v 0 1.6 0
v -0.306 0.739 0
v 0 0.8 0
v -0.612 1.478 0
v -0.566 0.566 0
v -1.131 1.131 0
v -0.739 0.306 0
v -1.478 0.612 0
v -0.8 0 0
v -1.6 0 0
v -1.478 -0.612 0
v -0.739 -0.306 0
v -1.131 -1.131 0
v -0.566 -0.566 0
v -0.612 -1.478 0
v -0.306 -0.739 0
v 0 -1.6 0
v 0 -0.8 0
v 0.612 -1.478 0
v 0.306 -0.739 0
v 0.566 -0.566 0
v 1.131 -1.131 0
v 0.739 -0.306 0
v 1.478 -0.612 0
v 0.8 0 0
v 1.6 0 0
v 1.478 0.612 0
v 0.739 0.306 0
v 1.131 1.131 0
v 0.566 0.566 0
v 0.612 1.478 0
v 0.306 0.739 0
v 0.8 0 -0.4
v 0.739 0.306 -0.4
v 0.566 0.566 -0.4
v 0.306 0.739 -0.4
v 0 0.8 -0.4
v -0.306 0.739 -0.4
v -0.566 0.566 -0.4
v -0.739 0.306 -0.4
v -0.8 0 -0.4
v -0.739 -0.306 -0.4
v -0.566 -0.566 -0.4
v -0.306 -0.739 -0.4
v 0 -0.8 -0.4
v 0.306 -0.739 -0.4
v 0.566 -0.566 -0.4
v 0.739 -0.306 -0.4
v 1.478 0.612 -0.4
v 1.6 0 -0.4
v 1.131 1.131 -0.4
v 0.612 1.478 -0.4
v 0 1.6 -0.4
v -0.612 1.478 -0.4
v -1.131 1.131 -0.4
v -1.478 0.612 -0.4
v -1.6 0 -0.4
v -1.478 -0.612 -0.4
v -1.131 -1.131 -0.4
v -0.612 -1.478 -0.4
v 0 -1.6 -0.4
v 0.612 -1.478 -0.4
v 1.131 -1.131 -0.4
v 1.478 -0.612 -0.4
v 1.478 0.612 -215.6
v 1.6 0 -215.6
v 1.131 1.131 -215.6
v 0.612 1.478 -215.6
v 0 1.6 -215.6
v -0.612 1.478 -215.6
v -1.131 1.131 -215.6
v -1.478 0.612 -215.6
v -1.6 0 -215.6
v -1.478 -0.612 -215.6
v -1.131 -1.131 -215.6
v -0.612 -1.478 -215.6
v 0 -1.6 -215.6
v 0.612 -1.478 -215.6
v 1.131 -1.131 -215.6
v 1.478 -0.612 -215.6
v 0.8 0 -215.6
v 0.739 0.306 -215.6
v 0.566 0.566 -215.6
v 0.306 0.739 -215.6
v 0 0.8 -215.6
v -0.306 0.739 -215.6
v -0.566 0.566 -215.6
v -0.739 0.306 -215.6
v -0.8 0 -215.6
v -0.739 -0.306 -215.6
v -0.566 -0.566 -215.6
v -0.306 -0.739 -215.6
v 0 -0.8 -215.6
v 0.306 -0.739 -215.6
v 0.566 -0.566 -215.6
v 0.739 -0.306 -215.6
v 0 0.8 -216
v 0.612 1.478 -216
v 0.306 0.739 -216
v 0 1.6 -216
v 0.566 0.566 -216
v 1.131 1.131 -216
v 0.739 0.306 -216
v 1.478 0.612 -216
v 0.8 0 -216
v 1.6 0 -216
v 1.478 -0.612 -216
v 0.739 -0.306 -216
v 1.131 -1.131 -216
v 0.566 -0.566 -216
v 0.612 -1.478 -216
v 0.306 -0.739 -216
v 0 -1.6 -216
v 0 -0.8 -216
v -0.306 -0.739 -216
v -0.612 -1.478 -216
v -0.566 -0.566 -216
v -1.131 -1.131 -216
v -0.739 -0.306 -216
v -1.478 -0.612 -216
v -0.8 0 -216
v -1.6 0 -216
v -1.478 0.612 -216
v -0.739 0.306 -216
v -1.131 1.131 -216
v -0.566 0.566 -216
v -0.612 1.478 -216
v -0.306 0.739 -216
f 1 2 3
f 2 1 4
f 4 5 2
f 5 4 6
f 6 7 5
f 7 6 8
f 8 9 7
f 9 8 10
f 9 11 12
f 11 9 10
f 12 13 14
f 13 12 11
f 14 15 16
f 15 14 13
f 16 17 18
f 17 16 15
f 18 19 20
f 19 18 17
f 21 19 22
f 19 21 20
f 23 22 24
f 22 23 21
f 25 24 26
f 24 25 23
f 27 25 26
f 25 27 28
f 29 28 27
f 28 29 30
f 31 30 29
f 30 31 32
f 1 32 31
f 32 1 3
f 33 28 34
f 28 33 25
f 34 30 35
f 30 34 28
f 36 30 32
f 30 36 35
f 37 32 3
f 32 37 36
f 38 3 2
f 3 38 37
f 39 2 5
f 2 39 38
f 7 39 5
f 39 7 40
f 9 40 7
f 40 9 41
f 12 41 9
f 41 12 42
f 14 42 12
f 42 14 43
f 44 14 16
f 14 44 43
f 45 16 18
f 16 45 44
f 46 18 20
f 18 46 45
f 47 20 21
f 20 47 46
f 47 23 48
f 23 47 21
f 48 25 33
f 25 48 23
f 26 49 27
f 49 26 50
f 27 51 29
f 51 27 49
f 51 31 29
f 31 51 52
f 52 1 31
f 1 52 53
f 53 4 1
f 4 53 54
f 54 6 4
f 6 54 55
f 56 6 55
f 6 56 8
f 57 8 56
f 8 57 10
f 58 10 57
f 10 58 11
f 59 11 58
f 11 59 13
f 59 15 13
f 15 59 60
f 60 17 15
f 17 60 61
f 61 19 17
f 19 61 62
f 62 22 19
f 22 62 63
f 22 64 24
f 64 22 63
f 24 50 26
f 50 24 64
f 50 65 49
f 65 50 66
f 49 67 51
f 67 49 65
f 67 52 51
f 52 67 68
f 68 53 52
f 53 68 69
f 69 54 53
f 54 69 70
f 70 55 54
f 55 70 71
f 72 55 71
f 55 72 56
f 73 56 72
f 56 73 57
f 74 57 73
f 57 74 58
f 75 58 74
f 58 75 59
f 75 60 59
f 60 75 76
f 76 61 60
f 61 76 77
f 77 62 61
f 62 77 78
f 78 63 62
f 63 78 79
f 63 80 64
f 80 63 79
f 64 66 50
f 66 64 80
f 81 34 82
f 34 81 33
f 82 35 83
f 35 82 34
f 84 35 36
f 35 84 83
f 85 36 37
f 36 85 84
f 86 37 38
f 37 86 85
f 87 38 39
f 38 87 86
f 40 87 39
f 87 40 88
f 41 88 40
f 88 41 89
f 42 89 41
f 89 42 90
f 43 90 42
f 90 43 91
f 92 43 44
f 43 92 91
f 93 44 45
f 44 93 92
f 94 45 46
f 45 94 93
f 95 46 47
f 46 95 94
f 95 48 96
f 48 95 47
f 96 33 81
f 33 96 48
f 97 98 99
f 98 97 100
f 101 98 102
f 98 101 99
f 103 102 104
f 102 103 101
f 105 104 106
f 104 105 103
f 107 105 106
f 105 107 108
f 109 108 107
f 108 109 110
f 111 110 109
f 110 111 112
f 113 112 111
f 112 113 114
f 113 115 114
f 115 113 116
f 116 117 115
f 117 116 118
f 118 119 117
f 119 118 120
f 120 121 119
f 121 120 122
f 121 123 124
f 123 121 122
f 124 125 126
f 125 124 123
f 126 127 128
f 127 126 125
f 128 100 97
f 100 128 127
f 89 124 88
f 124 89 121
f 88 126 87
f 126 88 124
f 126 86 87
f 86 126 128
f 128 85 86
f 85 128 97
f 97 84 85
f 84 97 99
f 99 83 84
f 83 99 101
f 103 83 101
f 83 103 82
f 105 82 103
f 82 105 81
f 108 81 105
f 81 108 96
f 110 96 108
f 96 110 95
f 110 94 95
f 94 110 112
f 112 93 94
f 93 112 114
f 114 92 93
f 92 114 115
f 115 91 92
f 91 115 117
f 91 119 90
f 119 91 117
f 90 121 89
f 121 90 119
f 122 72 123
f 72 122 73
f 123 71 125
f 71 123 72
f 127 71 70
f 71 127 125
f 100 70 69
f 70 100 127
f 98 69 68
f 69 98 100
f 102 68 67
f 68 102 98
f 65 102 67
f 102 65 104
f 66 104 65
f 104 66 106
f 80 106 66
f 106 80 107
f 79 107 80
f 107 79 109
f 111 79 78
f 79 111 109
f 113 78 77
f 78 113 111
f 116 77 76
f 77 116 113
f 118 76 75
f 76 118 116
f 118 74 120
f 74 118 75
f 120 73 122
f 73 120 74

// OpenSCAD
// file: ../p/4-4disc.scad
use <../lib.scad>
$fa=1; $fs=0.2;
function ldraw_lib__4_4disc(realsolid=false) = [
// 0 Disc 1.0
// 0 Name: 4-4disc.dat
// 0 Author: James Jessiman
// 0 !LDRAW_ORG Primitive UPDATE 2002-02
// 0 !LICENSE Licensed under CC BY 2.0 and CC BY 4.0 : see CAreadme.txt
// 
// 0 BFC CERTIFY CCW
  [0,"BFC","CERTIFY"],
  [0,"BFC","CCW"],
// 
// 0 !HISTORY 1998-12-15 [PTadmin] Official Update 1998-10
// 0 !HISTORY 2002-03-23 [sbliss] Added BFC statement
// 0 !HISTORY 2002-04-25 [PTadmin] Official Update 2002-02
// 0 !HISTORY 2007-06-24 [PTadmin] Header formatted for Contributor Agreement
// 0 !HISTORY 2008-07-01 [PTadmin] Official Update 2008-01
// 
// 
// 3 16 0 0 0 1 0 0 0.9239 0 0.3827
  [3,16,0,0,0,1,0,0,0.9239,0,0.3827],
// 3 16 0 0 0 0.9239 0 0.3827 0.7071 0 0.7071
  [3,16,0,0,0,0.9239,0,0.3827,0.7071,0,0.7071],
// 3 16 0 0 0 0.7071 0 0.7071 0.3827 0 0.9239
  [3,16,0,0,0,0.7071,0,0.7071,0.3827,0,0.9239],
// 3 16 0 0 0 0.3827 0 0.9239 0 0 1
  [3,16,0,0,0,0.3827,0,0.9239,0,0,1],
// 3 16 0 0 0 0 0 1 -0.3827 0 0.9239
  [3,16,0,0,0,0,0,1,-0.3827,0,0.9239],
// 3 16 0 0 0 -0.3827 0 0.9239 -0.7071 0 0.7071
  [3,16,0,0,0,-0.3827,0,0.9239,-0.7071,0,0.7071],
// 3 16 0 0 0 -0.7071 0 0.7071 -0.9239 0 0.3827
  [3,16,0,0,0,-0.7071,0,0.7071,-0.9239,0,0.3827],
// 3 16 0 0 0 -0.9239 0 0.3827 -1 0 -0
  [3,16,0,0,0,-0.9239,0,0.3827,-1,0,-0],
// 3 16 0 0 0 -1 0 -0 -0.9239 0 -0.3827
  [3,16,0,0,0,-1,0,-0,-0.9239,0,-0.3827],
// 3 16 0 0 0 -0.9239 0 -0.3827 -0.7071 0 -0.7071
  [3,16,0,0,0,-0.9239,0,-0.3827,-0.7071,0,-0.7071],
// 3 16 0 0 0 -0.7071 0 -0.7071 -0.3827 0 -0.9239
  [3,16,0,0,0,-0.7071,0,-0.7071,-0.3827,0,-0.9239],
// 3 16 0 0 0 -0.3827 0 -0.9239 0 0 -1
  [3,16,0,0,0,-0.3827,0,-0.9239,0,0,-1],
// 3 16 0 0 0 0 0 -1 0.3827 0 -0.9239
  [3,16,0,0,0,0,0,-1,0.3827,0,-0.9239],
// 3 16 0 0 0 0.3827 0 -0.9239 0.7071 0 -0.7071
  [3,16,0,0,0,0.3827,0,-0.9239,0.7071,0,-0.7071],
// 3 16 0 0 0 0.7071 0 -0.7071 0.9239 0 -0.3827
  [3,16,0,0,0,0.7071,0,-0.7071,0.9239,0,-0.3827],
// 3 16 0 0 0 0.9239 0 -0.3827 1 0 0
  [3,16,0,0,0,0.9239,0,-0.3827,1,0,0],
// 0
];
module ldraw_lib__4_4disc(step=0, col=false, unit=2/5, alt=false, line=0.2, solid=!$preview)
    makepoly(ldraw_lib__4_4disc(solid), step=step, col=col, unit=unit, alt=alt, line=line, solid=solid);
ldraw_lib__4_4disc(line=0.2);
// file: ../p/stud3.scad
use <../lib.scad>
use <4-4cyli.scad>
use <4-4disc.scad>
use <4-4edge.scad>
$fa=1; $fs=0.2;
function ldraw_lib__stud3(realsolid=false) = realsolid ? 
    [openscad(translate([0,0,-eps()], o=cylinder(4+eps(), r=4)),2)] : [
// 0 Stud Tube Solid
// 0 Name: stud3.dat
// 0 Author: James Jessiman
// 0 !LDRAW_ORG Primitive UPDATE 2012-01
// 0 !LICENSE Licensed under CC BY 2.0 and CC BY 4.0 : see CAreadme.txt
// 
// 0 BFC CERTIFY CCW
  [0,"BFC","CERTIFY"],
  [0,"BFC","CCW"],
// 
// 0 !HISTORY 2002-04-04 [sbliss] Modified for BFC compliance
// 0 !HISTORY 2002-04-25 [PTadmin] Official Update 2002-02
// 0 !HISTORY 2007-06-24 [PTadmin] Header formatted for Contributor Agreement
// 0 !HISTORY 2008-07-01 [PTadmin] Official Update 2008-01
// 0 !HISTORY 2012-02-16 [Philo] Changed to CCW
// 0 !HISTORY 2012-03-30 [PTadmin] Official Update 2012-01
// 
// 
// 1 16 0 -4 0 4 0 0 0 1 0 0 0 4 4-4edge.dat
  [1,16,0,-4,0,4,0,0,0,1,0,0,0,4, ldraw_lib__4_4edge(realsolid)],
// 1 16 0 0 0 4 0 0 0 1 0 0 0 4 4-4edge.dat
  [1,16,0,0,0,4,0,0,0,1,0,0,0,4, ldraw_lib__4_4edge(realsolid)],
// 1 16 0 -4 0 4 0 0 0 1 0 0 0 4 4-4disc.dat
  [1,16,0,-4,0,4,0,0,0,1,0,0,0,4, ldraw_lib__4_4disc(realsolid)],
// 1 16 0 -4 0 4 0 0 0 4 0 0 0 4 4-4cyli.dat
  [1,16,0,-4,0,4,0,0,0,4,0,0,0,4, ldraw_lib__4_4cyli(realsolid)],
];
module ldraw_lib__stud3(step=0, col=false, unit=2/5, alt=false, line=0.2, solid=!$preview)
    makepoly(ldraw_lib__stud3(solid), step=step, col=col, unit=unit, alt=alt, line=line, solid=solid);
ldraw_lib__stud3(line=0.2);
// file: ../p/stud.scad
use <../lib.scad>
use <4-4cyli.scad>
use <4-4disc.scad>
use <4-4edge.scad>
$fa=1; $fs=0.2;
function ldraw_lib__stud(realsolid=false) = realsolid ? 
    [openscad(translate([0,0,-eps()], o=cylinder(4+eps(), r=6)),2)] : [
// 0 Stud
// 0 Name: stud.dat
// 0 Author: James Jessiman
// 0 !LDRAW_ORG Primitive UPDATE 2012-01
// 0 !LICENSE Licensed under CC BY 2.0 and CC BY 4.0 : see CAreadme.txt
// 
// 0 BFC CERTIFY CCW
  [0,"BFC","CERTIFY"],
  [0,"BFC","CCW"],
// 
// 0 !HISTORY 2002-04-04 [sbliss] Modified for BFC compliance
// 0 !HISTORY 2002-04-25 [PTadmin] Official Update 2002-02
// 0 !HISTORY 2007-06-24 [PTadmin] Header formatted for Contributor Agreement
// 0 !HISTORY 2008-07-01 [PTadmin] Official Update 2008-01
// 0 !HISTORY 2012-02-16 [Philo] Changed to CCW
// 0 !HISTORY 2012-03-30 [PTadmin] Official Update 2012-01
// 
// 
// 1 16 0 0 0 6 0 0 0 1 0 0 0 6 4-4edge.dat
  [1,16,0,0,0,6,0,0,0,1,0,0,0,6, ldraw_lib__4_4edge(realsolid)],
// 1 16 0 -4 0 6 0 0 0 1 0 0 0 6 4-4edge.dat
  [1,16,0,-4,0,6,0,0,0,1,0,0,0,6, ldraw_lib__4_4edge(realsolid)],
// 1 16 0 0 0 6 0 0 0 -4 0 0 0 6 4-4cyli.dat
  [1,16,0,0,0,6,0,0,0,-4,0,0,0,6, ldraw_lib__4_4cyli(realsolid)],
// 1 16 0 -4 0 6 0 0 0 1 0 0 0 6 4-4disc.dat
  [1,16,0,-4,0,6,0,0,0,1,0,0,0,6, ldraw_lib__4_4disc(realsolid)],
];
module ldraw_lib__stud(step=0, col=false, unit=2/5, alt=false, line=0.2, solid=!$preview)
    makepoly(ldraw_lib__stud(solid), step=step, col=col, unit=unit, alt=alt, line=line, solid=solid);
ldraw_lib__stud(line=0.2);
// file: ../p/box5.scad
use <../lib.scad>
$fa=1; $fs=0.2;
function ldraw_lib__box5(realsolid=false) = [
// 0 Box with 5 Faces and All Edges
// 0 Name: box5.dat
// 0 Author: James Jessiman
// 0 !LDRAW_ORG Primitive UPDATE 2012-01
// 0 !LICENSE Licensed under CC BY 2.0 and CC BY 4.0 : see CAreadme.txt
// 
// 0 BFC CERTIFY CCW
  [0,"BFC","CERTIFY"],
  [0,"BFC","CCW"],
// 
// 0 !HISTORY 2002-04-03 [sbliss] Modified for BFC compliance
// 0 !HISTORY 2002-04-25 [PTadmin] Official Update 2002-02
// 0 !HISTORY 2007-06-24 [PTadmin] Header formatted for Contributor Agreement
// 0 !HISTORY 2008-07-01 [PTadmin] Official Update 2008-01
// 0 !HISTORY 2012-02-16 [Philo] Changed to CCW
// 0 !HISTORY 2012-03-30 [PTadmin] Official Update 2012-01
// 
// 
// 2 24 1 1 1 -1 1 1
  [2,24,1,1,1,-1,1,1],
// 2 24 -1 1 1 -1 1 -1
  [2,24,-1,1,1,-1,1,-1],
// 2 24 -1 1 -1 1 1 -1
  [2,24,-1,1,-1,1,1,-1],
// 2 24 1 1 -1 1 1 1
  [2,24,1,1,-1,1,1,1],
// 2 24 1 0 1 -1 0 1
  [2,24,1,0,1,-1,0,1],
// 2 24 -1 0 1 -1 0 -1
  [2,24,-1,0,1,-1,0,-1],
// 2 24 -1 0 -1 1 0 -1
  [2,24,-1,0,-1,1,0,-1],
// 2 24 1 0 -1 1 0 1
  [2,24,1,0,-1,1,0,1],
// 2 24 1 0 1 1 1 1
  [2,24,1,0,1,1,1,1],
// 2 24 -1 0 1 -1 1 1
  [2,24,-1,0,1,-1,1,1],
// 2 24 1 0 -1 1 1 -1
  [2,24,1,0,-1,1,1,-1],
// 2 24 -1 0 -1 -1 1 -1
  [2,24,-1,0,-1,-1,1,-1],
// 4 16 -1 1 1 1 1 1 1 1 -1 -1 1 -1
  [4,16,-1,1,1,1,1,1,1,1,-1,-1,1,-1],
// 4 16 -1 1 1 -1 0 1 1 0 1 1 1 1
  [4,16,-1,1,1,-1,0,1,1,0,1,1,1,1],
// 4 16 -1 1 -1 -1 0 -1 -1 0 1 -1 1 1
  [4,16,-1,1,-1,-1,0,-1,-1,0,1,-1,1,1],
// 4 16 1 1 -1 1 0 -1 -1 0 -1 -1 1 -1
  [4,16,1,1,-1,1,0,-1,-1,0,-1,-1,1,-1],
// 4 16 1 1 1 1 0 1 1 0 -1 1 1 -1
  [4,16,1,1,1,1,0,1,1,0,-1,1,1,-1],
];
module ldraw_lib__box5(step=0, col=false, unit=2/5, alt=false, line=0.2, solid=!$preview)
    makepoly(ldraw_lib__box5(solid), step=step, col=col, unit=unit, alt=alt, line=line, solid=solid);
ldraw_lib__box5(line=0.2);
// file: ../p/box4t.scad
use <../lib.scad>
$fa=1; $fs=0.2;
function ldraw_lib__box4t(realsolid=false) = [
// 0 Box with 4 Adjacent Faces and All Edges
// 0 Name: box4t.dat
// 0 Author: Tore Eriksson [Tore_Eriksson]
// 0 !LDRAW_ORG Primitive UPDATE 2003-02
// 0 !LICENSE Licensed under CC BY 2.0 and CC BY 4.0 : see CAreadme.txt
// 
// 0 BFC CERTIFY CCW
  [0,"BFC","CERTIFY"],
  [0,"BFC","CCW"],
// 
// 0 !HISTORY 1997-09-29 [PTadmin] Official Update 1997-15
// 0 !HISTORY 2002-08-31 [izanette] Modified with WINDZ for BFC compliance
// 0 !HISTORY 2003-08-01 [PTadmin] Official Update 2003-02
// 0 !HISTORY 2007-06-24 [PTadmin] Header formatted for Contributor Agreement
// 0 !HISTORY 2008-07-01 [PTadmin] Official Update 2008-01
// 
// 
// 2 24 1 1 1 -1 1 1
  [2,24,1,1,1,-1,1,1],
// 2 24 -1 1 1 -1 1 -1
  [2,24,-1,1,1,-1,1,-1],
// 2 24 -1 1 -1 1 1 -1
  [2,24,-1,1,-1,1,1,-1],
// 2 24 1 1 -1 1 1 1
  [2,24,1,1,-1,1,1,1],
// 2 24 1 0 1 -1 0 1
  [2,24,1,0,1,-1,0,1],
// 2 24 -1 0 1 -1 0 -1
  [2,24,-1,0,1,-1,0,-1],
// 2 24 -1 0 -1 1 0 -1
  [2,24,-1,0,-1,1,0,-1],
// 2 24 1 0 -1 1 0 1
  [2,24,1,0,-1,1,0,1],
// 2 24 1 0 1 1 1 1
  [2,24,1,0,1,1,1,1],
// 2 24 -1 0 1 -1 1 1
  [2,24,-1,0,1,-1,1,1],
// 2 24 1 0 -1 1 1 -1
  [2,24,1,0,-1,1,1,-1],
// 2 24 -1 0 -1 -1 1 -1
  [2,24,-1,0,-1,-1,1,-1],
// 4 16 1 1 1 1 1 -1 -1 1 -1 -1 1 1
  [4,16,1,1,1,1,1,-1,-1,1,-1,-1,1,1],
// 4 16 1 1 1 -1 1 1 -1 0 1 1 0 1
  [4,16,1,1,1,-1,1,1,-1,0,1,1,0,1],
// 4 16 -1 1 1 -1 1 -1 -1 0 -1 -1 0 1
  [4,16,-1,1,1,-1,1,-1,-1,0,-1,-1,0,1],
// 0 4 16 -1 1 -1 -1 0 -1 1 0 -1 1 1 -1
// 4 16 1 1 -1 1 1 1 1 0 1 1 0 -1
  [4,16,1,1,-1,1,1,1,1,0,1,1,0,-1],
// 0
];
module ldraw_lib__box4t(step=0, col=false, unit=2/5, alt=false, line=0.2, solid=!$preview)
    makepoly(ldraw_lib__box4t(solid), step=step, col=col, unit=unit, alt=alt, line=line, solid=solid);
ldraw_lib__box4t(line=0.2);
// file: s/3004s01.scad
use <../../lib.scad>
use <../../p/box4t.scad>
use <../../p/box5.scad>
use <../../p/stud.scad>
use <../../p/stud3.scad>
$fa=1; $fs=0.2;
function ldraw_lib__s__3004s01(realsolid=false) = [
// 0 ~Brick  1 x  2 without Front Face
// 0 Name: s\3004s01.dat
// 0 Author: James Jessiman
// 0 !LDRAW_ORG Subpart UPDATE 2003-03
// 0 !LICENSE Licensed under CC BY 2.0 and CC BY 4.0 : see CAreadme.txt
// 
// 0 BFC CERTIFY CCW
  [0,"BFC","CERTIFY"],
  [0,"BFC","CCW"],
// 
// 0 !HISTORY 2003-09-07 [jriley] Subfiling, BFC
// 0 !HISTORY 2003-12-19 [PTadmin] Official Update 2003-03
// 0 !HISTORY 2007-08-29 [PTadmin] Header formatted for Contributor Agreement
// 0 !HISTORY 2008-07-01 [PTadmin] Official Update 2008-01
// 
// 
// 1 16 0 4 0 1 0 0 0 -5 0 0 0 1 stud3.dat
  [1,16,0,4,0,1,0,0,0,-5,0,0,0,1, ldraw_lib__stud3(realsolid)],
// 0 BFC INVERTNEXT
  [0,"BFC","INVERTNEXT"],
// 1 16 0 24 0 16 0 0 0 -20 0 0 0 6 box5.dat
  [1,16,0,24,0,16,0,0,0,-20,0,0,0,6, ldraw_lib__box5(realsolid)],
// 4 16 20 24 10 16 24 6 -16 24 6 -20 24 10
  [4,16,20,24,10,16,24,6,-16,24,6,-20,24,10],
// 4 16 -20 24 10 -16 24 6 -16 24 -6 -20 24 -10
  [4,16,-20,24,10,-16,24,6,-16,24,-6,-20,24,-10],
// 4 16 -20 24 -10 -16 24 -6 16 24 -6 20 24 -10
  [4,16,-20,24,-10,-16,24,-6,16,24,-6,20,24,-10],
// 4 16 20 24 -10 16 24 -6 16 24 6 20 24 10
  [4,16,20,24,-10,16,24,-6,16,24,6,20,24,10],
// 1 16 0 24 0 20 0 0 0 -24 0 0 0 10 box4t.dat
  [1,16,0,24,0,20,0,0,0,-24,0,0,0,10, ldraw_lib__box4t(realsolid)],
// 1 16 10 0 0 1 0 0 0 1 0 0 0 1 stud.dat
  [1,16,10,0,0,1,0,0,0,1,0,0,0,1, ldraw_lib__stud(realsolid)],
// 1 16 -10 0 0 1 0 0 0 1 0 0 0 1 stud.dat
  [1,16,-10,0,0,1,0,0,0,1,0,0,0,1, ldraw_lib__stud(realsolid)],
// 0
];
module ldraw_lib__s__3004s01(step=0, col=false, unit=2/5, alt=false, line=0.2, solid=!$preview)
    makepoly(ldraw_lib__s__3004s01(solid), step=step, col=col, unit=unit, alt=alt, line=line, solid=solid);
ldraw_lib__s__3004s01(line=0.2);
// file: ../p/4-4ring1.scad
use <../lib.scad>
$fa=1; $fs=0.2;
function ldraw_lib__4_4ring1(realsolid=false) = [
// 0 Ring  1 x 1.0
// 0 Name: 4-4ring1.dat
// 0 Author: James Jessiman
// 0 !LDRAW_ORG Primitive UPDATE 2009-01
// 0 !LICENSE Licensed under CC BY 2.0 and CC BY 4.0 : see CAreadme.txt
// 
// 0 BFC CERTIFY CCW
  [0,"BFC","CERTIFY"],
  [0,"BFC","CCW"],
// 
// 0 !HISTORY 1998-12-15 [PTadmin] Official Update 1998-10
// 0 !HISTORY 2002-04-08 [BrickCaster] Modified for BFC compliance
// 0 !HISTORY 2002-04-25 [PTadmin] Official Update 2002-02
// 0 !HISTORY 2007-06-24 [PTadmin] Header formatted for Contributor Agreement
// 0 !HISTORY 2008-07-01 [PTadmin] Official Update 2008-01
// 0 !HISTORY 2008-08-26 [cwdee] Switch polygon winding and rename
// 0 !HISTORY 2009-05-02 [PTadmin] Official Update 2009-01
// 
// 
// 4 16 -0.7654 0 1.8478 -0.3827 0 0.9239 0 0 1 0 0 2
  [4,16,-0.7654,0,1.8478,-0.3827,0,0.9239,0,0,1,0,0,2],
// 4 16 -1.4142 0 1.4142 -0.7071 0 0.7071 -0.3827 0 0.9239 -0.7654 0 1.8478
  [4,16,-1.4142,0,1.4142,-0.7071,0,0.7071,-0.3827,0,0.9239,-0.7654,0,1.8478],
// 4 16 -1.8478 0 0.7654 -0.9239 0 0.3827 -0.7071 0 0.7071 -1.4142 0 1.41420
  [4,16,-1.8478,0,0.7654,-0.9239,0,0.3827,-0.7071,0,0.7071,-1.4142,0,1.41420],
// 4 16 -2 0 0 -1 0 0 -0.9239 0 0.3827 -1.8478 0 0.7654
  [4,16,-2,0,0,-1,0,0,-0.9239,0,0.3827,-1.8478,0,0.7654],
// 4 16 -1.8478 0 -0.7654 -0.9239 0 -0.3827 -1 0 0 -2 0 0
  [4,16,-1.8478,0,-0.7654,-0.9239,0,-0.3827,-1,0,0,-2,0,0],
// 4 16 -1.4142 0 -1.4142 -0.7071 0 -0.7071 -0.9239 0 -0.3827 -1.8478 0 -0.7654
  [4,16,-1.4142,0,-1.4142,-0.7071,0,-0.7071,-0.9239,0,-0.3827,-1.8478,0,-0.7654],
// 4 16 -0.7654 0 -1.8478 -0.3827 0 -0.9239 -0.7071 0 -0.7071 -1.4142 0 -1.4142
  [4,16,-0.7654,0,-1.8478,-0.3827,0,-0.9239,-0.7071,0,-0.7071,-1.4142,0,-1.4142],
// 4 16 0 0 -2 0 0 -1 -0.3827 0 -0.9239 -0.7654 0 -1.8478
  [4,16,0,0,-2,0,0,-1,-0.3827,0,-0.9239,-0.7654,0,-1.8478],
// 4 16 0.7654 0 -1.8478 0.3827 0 -0.9239 0 0 -1 0 0 -2
  [4,16,0.7654,0,-1.8478,0.3827,0,-0.9239,0,0,-1,0,0,-2],
// 4 16 1.4142 0 -1.4142 0.7071 0 -0.7071 0.3827 0 -0.9239 0.7654 0 -1.8478
  [4,16,1.4142,0,-1.4142,0.7071,0,-0.7071,0.3827,0,-0.9239,0.7654,0,-1.8478],
// 4 16 1.8478 0 -0.7654 0.9239 0 -0.3827 0.7071 0 -0.7071 1.4142 0 -1.4142
  [4,16,1.8478,0,-0.7654,0.9239,0,-0.3827,0.7071,0,-0.7071,1.4142,0,-1.4142],
// 4 16 2 0 0 1 0 0 0.9239 0 -0.3827 1.8478 0 -0.7654
  [4,16,2,0,0,1,0,0,0.9239,0,-0.3827,1.8478,0,-0.7654],
// 4 16 1.8478 0 0.7654 0.9239 0 0.3827 1 0 0 2 0 0
  [4,16,1.8478,0,0.7654,0.9239,0,0.3827,1,0,0,2,0,0],
// 4 16 1.4142 0 1.4142 0.7071 0 0.7071 0.9239 0 0.3827 1.8478 0 0.7654
  [4,16,1.4142,0,1.4142,0.7071,0,0.7071,0.9239,0,0.3827,1.8478,0,0.7654],
// 4 16 0.7654 0 1.8478 0.3827 0 0.9239 0.7071 0 0.7071 1.4142 0 1.4142
  [4,16,0.7654,0,1.8478,0.3827,0,0.9239,0.7071,0,0.7071,1.4142,0,1.4142],
// 4 16 0 0 2 0 0 1 0.3827 0 0.9239 0.7654 0 1.8478
  [4,16,0,0,2,0,0,1,0.3827,0,0.9239,0.7654,0,1.8478],
// 0
];
module ldraw_lib__4_4ring1(step=0, col=false, unit=2/5, alt=false, line=0.2, solid=!$preview)
    makepoly(ldraw_lib__4_4ring1(solid), step=step, col=col, unit=unit, alt=alt, line=line, solid=solid);
ldraw_lib__4_4ring1(line=0.2);
// file: ../p/4-4edge.scad
use <../lib.scad>
$fa=1; $fs=0.2;
function ldraw_lib__4_4edge(realsolid=false) = [
// 0 Circle 1.0
// 0 Name: 4-4edge.dat
// 0 Author: James Jessiman
// 0 !LDRAW_ORG Primitive UPDATE 2017-01
// 0 !LICENSE Licensed under CC BY 2.0 and CC BY 4.0 : see CAreadme.txt
// 
// 0 BFC CERTIFY CCW
  [0,"BFC","CERTIFY"],
  [0,"BFC","CCW"],
// 
// 0 !HISTORY 1998-12-15 [PTadmin] Official Update 1998-10
// 0 !HISTORY 2005-12-28 [PTadmin] Official Update 2005-01
// 0 !HISTORY 2007-06-24 [PTadmin] Header formatted for Contributor Agreement
// 0 !HISTORY 2008-07-01 [PTadmin] Official Update 2008-01
// 0 !HISTORY 2017-01-15 [Steffen] BFCed
// 0 !HISTORY 2017-12-30 [PTadmin] Official Update 2017-01
// 
// 
// 2 24 1 0 0 0.9239 0 0.3827
  [2,24,1,0,0,0.9239,0,0.3827],
// 2 24 0.9239 0 0.3827 0.7071 0 0.7071
  [2,24,0.9239,0,0.3827,0.7071,0,0.7071],
// 2 24 0.7071 0 0.7071 0.3827 0 0.9239
  [2,24,0.7071,0,0.7071,0.3827,0,0.9239],
// 2 24 0.3827 0 0.9239 0 0 1
  [2,24,0.3827,0,0.9239,0,0,1],
// 2 24 0 0 1 -0.3827 0 0.9239
  [2,24,0,0,1,-0.3827,0,0.9239],
// 2 24 -0.3827 0 0.9239 -0.7071 0 0.7071
  [2,24,-0.3827,0,0.9239,-0.7071,0,0.7071],
// 2 24 -0.7071 0 0.7071 -0.9239 0 0.3827
  [2,24,-0.7071,0,0.7071,-0.9239,0,0.3827],
// 2 24 -0.9239 0 0.3827 -1 0 -0
  [2,24,-0.9239,0,0.3827,-1,0,-0],
// 2 24 -1 0 -0 -0.9239 0 -0.3827
  [2,24,-1,0,-0,-0.9239,0,-0.3827],
// 2 24 -0.9239 0 -0.3827 -0.7071 0 -0.7071
  [2,24,-0.9239,0,-0.3827,-0.7071,0,-0.7071],
// 2 24 -0.7071 0 -0.7071 -0.3827 0 -0.9239
  [2,24,-0.7071,0,-0.7071,-0.3827,0,-0.9239],
// 2 24 -0.3827 0 -0.9239 0 0 -1
  [2,24,-0.3827,0,-0.9239,0,0,-1],
// 2 24 0 0 -1 0.3827 0 -0.9239
  [2,24,0,0,-1,0.3827,0,-0.9239],
// 2 24 0.3827 0 -0.9239 0.7071 0 -0.7071
  [2,24,0.3827,0,-0.9239,0.7071,0,-0.7071],
// 2 24 0.7071 0 -0.7071 0.9239 0 -0.3827
  [2,24,0.7071,0,-0.7071,0.9239,0,-0.3827],
// 2 24 0.9239 0 -0.3827 1 0 0
  [2,24,0.9239,0,-0.3827,1,0,0],
];
module ldraw_lib__4_4edge(step=0, col=false, unit=2/5, alt=false, line=0.2, solid=!$preview)
    makepoly(ldraw_lib__4_4edge(solid), step=step, col=col, unit=unit, alt=alt, line=line, solid=solid);
ldraw_lib__4_4edge(line=0.2);
// file: ../p/4-4cyli.scad
use <../lib.scad>
$fa=1; $fs=0.2;
function ldraw_lib__4_4cyli(realsolid=false) = [
// 0 Cylinder 1.0
// 0 Name: 4-4cyli.dat
// 0 Author: James Jessiman
// 0 !LDRAW_ORG Primitive UPDATE 2005-01
// 0 !LICENSE Licensed under CC BY 2.0 and CC BY 4.0 : see CAreadme.txt
// 
// 0 BFC CERTIFY CCW
  [0,"BFC","CERTIFY"],
  [0,"BFC","CCW"],
// 
// 0 !HISTORY 1998-12-15 [PTadmin] Official Update 1998-10
// 0 !HISTORY 2002-03-23 [sbliss] Added BFC statement; merged headers from files in distributions LDraw 0.27 and Complete.
// 0 !HISTORY 2002-04-25 [PTadmin] Official Update 2002-02
// 0 !HISTORY 2004-12-14 [guyvivan] BFC CCW
// 0 !HISTORY 2005-12-28 [PTadmin] Official Update 2005-01
// 0 !HISTORY 2007-06-24 [PTadmin] Header formatted for Contributor Agreement
// 0 !HISTORY 2008-07-01 [PTadmin] Official Update 2008-01
// 
// 
// 4 16 1 1 0 0.9239 1 0.3827 0.9239 0 0.3827 1 0 0
  [4,16,1,1,0,0.9239,1,0.3827,0.9239,0,0.3827,1,0,0],
// 5 24 1 0 0 1 1 0 0.9239 0 0.3827 0.9239 0 -0.3827
  [5,24,1,0,0,1,1,0,0.9239,0,0.3827,0.9239,0,-0.3827],
// 4 16 0.9239 1 0.3827 0.7071 1 0.7071 0.7071 0 0.7071 0.9239 0 0.3827
  [4,16,0.9239,1,0.3827,0.7071,1,0.7071,0.7071,0,0.7071,0.9239,0,0.3827],
// 5 24 0.9239 0 0.3827 0.9239 1 0.3827 0.7071 0 0.7071 1 0 0
  [5,24,0.9239,0,0.3827,0.9239,1,0.3827,0.7071,0,0.7071,1,0,0],
// 4 16 0.7071 1 0.7071 0.3827 1 0.9239 0.3827 0 0.9239 0.7071 0 0.7071
  [4,16,0.7071,1,0.7071,0.3827,1,0.9239,0.3827,0,0.9239,0.7071,0,0.7071],
// 5 24 0.7071 0 0.7071 0.7071 1 0.7071 0.3827 0 0.9239 0.9239 0 0.3827
  [5,24,0.7071,0,0.7071,0.7071,1,0.7071,0.3827,0,0.9239,0.9239,0,0.3827],
// 4 16 0.3827 1 0.9239 0 1 1 0 0 1 0.3827 0 0.9239
  [4,16,0.3827,1,0.9239,0,1,1,0,0,1,0.3827,0,0.9239],
// 5 24 0.3827 0 0.9239 0.3827 1 0.9239 0 0 1 0.7071 0 0.7071
  [5,24,0.3827,0,0.9239,0.3827,1,0.9239,0,0,1,0.7071,0,0.7071],
// 4 16 0 1 1 -0.3827 1 0.9239 -0.3827 0 0.9239 0 0 1
  [4,16,0,1,1,-0.3827,1,0.9239,-0.3827,0,0.9239,0,0,1],
// 5 24 0 0 1 0 1 1 -0.3827 0 0.9239 0.3827 0 0.9239
  [5,24,0,0,1,0,1,1,-0.3827,0,0.9239,0.3827,0,0.9239],
// 4 16 -0.3827 1 0.9239 -0.7071 1 0.7071 -0.7071 0 0.7071 -0.3827 0 0.9239
  [4,16,-0.3827,1,0.9239,-0.7071,1,0.7071,-0.7071,0,0.7071,-0.3827,0,0.9239],
// 5 24 -0.3827 0 0.9239 -0.3827 1 0.9239 -0.7071 0 0.7071 0 0 1
  [5,24,-0.3827,0,0.9239,-0.3827,1,0.9239,-0.7071,0,0.7071,0,0,1],
// 4 16 -0.7071 1 0.7071 -0.9239 1 0.3827 -0.9239 0 0.3827 -0.7071 0 0.7071
  [4,16,-0.7071,1,0.7071,-0.9239,1,0.3827,-0.9239,0,0.3827,-0.7071,0,0.7071],
// 5 24 -0.7071 0 0.7071 -0.7071 1 0.7071 -0.9239 0 0.3827 -0.3827 0 0.9239
  [5,24,-0.7071,0,0.7071,-0.7071,1,0.7071,-0.9239,0,0.3827,-0.3827,0,0.9239],
// 4 16 -0.9239 1 0.3827 -1 1 0 -1 0 0 -0.9239 0 0.3827
  [4,16,-0.9239,1,0.3827,-1,1,0,-1,0,0,-0.9239,0,0.3827],
// 5 24 -0.9239 0 0.3827 -0.9239 1 0.3827 -1 0 0 -0.7071 0 0.7071
  [5,24,-0.9239,0,0.3827,-0.9239,1,0.3827,-1,0,0,-0.7071,0,0.7071],
// 4 16 -1 1 0 -0.9239 1 -0.3827 -0.9239 0 -0.3827 -1 0 0
  [4,16,-1,1,0,-0.9239,1,-0.3827,-0.9239,0,-0.3827,-1,0,0],
// 5 24 -1 0 0 -1 1 0 -0.9239 0 -0.3827 -0.9239 0 0.3827
  [5,24,-1,0,0,-1,1,0,-0.9239,0,-0.3827,-0.9239,0,0.3827],
// 4 16 -0.9239 1 -0.3827 -0.7071 1 -0.7071 -0.7071 0 -0.7071 -0.9239 0 -0.3827
  [4,16,-0.9239,1,-0.3827,-0.7071,1,-0.7071,-0.7071,0,-0.7071,-0.9239,0,-0.3827],
// 5 24 -0.9239 0 -0.3827 -0.9239 1 -0.3827 -0.7071 0 -0.7071 -1 0 0
  [5,24,-0.9239,0,-0.3827,-0.9239,1,-0.3827,-0.7071,0,-0.7071,-1,0,0],
// 4 16 -0.7071 1 -0.7071 -0.3827 1 -0.9239 -0.3827 0 -0.9239 -0.7071 0 -0.7071
  [4,16,-0.7071,1,-0.7071,-0.3827,1,-0.9239,-0.3827,0,-0.9239,-0.7071,0,-0.7071],
// 5 24 -0.7071 0 -0.7071 -0.7071 1 -0.7071 -0.3827 0 -0.9239 -0.9239 0 -0.3827
  [5,24,-0.7071,0,-0.7071,-0.7071,1,-0.7071,-0.3827,0,-0.9239,-0.9239,0,-0.3827],
// 4 16 -0.3827 1 -0.9239 0 1 -1 0 0 -1 -0.3827 0 -0.9239
  [4,16,-0.3827,1,-0.9239,0,1,-1,0,0,-1,-0.3827,0,-0.9239],
// 5 24 -0.3827 0 -0.9239 -0.3827 1 -0.9239 0 0 -1 -0.7071 0 -0.7071
  [5,24,-0.3827,0,-0.9239,-0.3827,1,-0.9239,0,0,-1,-0.7071,0,-0.7071],
// 4 16 0 1 -1 0.3827 1 -0.9239 0.3827 0 -0.9239 0 0 -1
  [4,16,0,1,-1,0.3827,1,-0.9239,0.3827,0,-0.9239,0,0,-1],
// 5 24 0 0 -1 0 1 -1 0.3827 0 -0.9239 -0.3827 0 -0.9239
  [5,24,0,0,-1,0,1,-1,0.3827,0,-0.9239,-0.3827,0,-0.9239],
// 4 16 0.3827 1 -0.9239 0.7071 1 -0.7071 0.7071 0 -0.7071 0.3827 0 -0.9239
  [4,16,0.3827,1,-0.9239,0.7071,1,-0.7071,0.7071,0,-0.7071,0.3827,0,-0.9239],
// 5 24 0.3827 0 -0.9239 0.3827 1 -0.9239 0.7071 0 -0.7071 0 0 -1
  [5,24,0.3827,0,-0.9239,0.3827,1,-0.9239,0.7071,0,-0.7071,0,0,-1],
// 4 16 0.7071 1 -0.7071 0.9239 1 -0.3827 0.9239 0 -0.3827 0.7071 0 -0.7071
  [4,16,0.7071,1,-0.7071,0.9239,1,-0.3827,0.9239,0,-0.3827,0.7071,0,-0.7071],
// 5 24 0.7071 0 -0.7071 0.7071 1 -0.7071 0.9239 0 -0.3827 0.3827 0 -0.9239
  [5,24,0.7071,0,-0.7071,0.7071,1,-0.7071,0.9239,0,-0.3827,0.3827,0,-0.9239],
// 4 16 0.9239 1 -0.3827 1 1 0 1 0 0 0.9239 0 -0.3827
  [4,16,0.9239,1,-0.3827,1,1,0,1,0,0,0.9239,0,-0.3827],
// 5 24 0.9239 0 -0.3827 0.9239 1 -0.3827 1 0 0 0.7071 0 -0.7071
  [5,24,0.9239,0,-0.3827,0.9239,1,-0.3827,1,0,0,0.7071,0,-0.7071],
// 0
];
module ldraw_lib__4_4cyli(step=0, col=false, unit=2/5, alt=false, line=0.2, solid=!$preview)
    makepoly(ldraw_lib__4_4cyli(solid), step=step, col=col, unit=unit, alt=alt, line=line, solid=solid);
ldraw_lib__4_4cyli(line=0.2);
// file: 3004.scad
use <../lib.scad>
use <s/3004s01.scad>
$fa=1; $fs=0.2;
function ldraw_lib__3004(realsolid=false) = [
// 0 Brick  1 x  2
// 0 Name: 3004.dat
// 0 Author: James Jessiman
// 0 !LDRAW_ORG Part UPDATE 2022-05
// 0 !LICENSE Licensed under CC BY 2.0 and CC BY 4.0 : see CAreadme.txt
// 
// 0 BFC CERTIFY CCW
  [0,"BFC","CERTIFY"],
  [0,"BFC","CCW"],
// 
// 0 !HISTORY 2001-10-26 [PTadmin] Official Update 2001-01
// 0 !HISTORY 2002-05-07 {unknown} BFC Certification
// 0 !HISTORY 2002-06-11 [PTadmin] Official Update 2002-03
// 0 !HISTORY 2007-05-07 [PTadmin] Header formatted for Contributor Agreement
// 0 !HISTORY 2008-07-01 [PTadmin] Official Update 2008-01
// 0 !HISTORY 2022-08-04 [MagFors] Using subfile
// 0 !HISTORY 2022-09-15 [PTadmin] Official Update 2022-05
// 
// 
// 1 16 0 0 0 1 0 0 0 1 0 0 0 1 s\3004s01.dat
  [1,16,0,0,0,1,0,0,0,1,0,0,0,1, ldraw_lib__s__3004s01(realsolid)],
// 4 16 -20 24 -10 20 24 -10 20 0 -10 -20 0 -10
  [4,16,-20,24,-10,20,24,-10,20,0,-10,-20,0,-10],
];
module ldraw_lib__3004(step=0, col=false, unit=2/5, alt=false, line=0.2, solid=!$preview)
    makepoly(ldraw_lib__3004(solid), step=step, col=col, unit=unit, alt=alt, line=line, solid=solid);
ldraw_lib__3004(line=0.2);
// file: u9053.scad
use <../lib.scad>
use <../p/4-4cyli.scad>
use <../p/4-4edge.scad>
use <../p/4-4ring1.scad>
$fa=1; $fs=0.2;
function ldraw_lib__u9053(realsolid=false) = [
// 0 ~Technic Flex-System Hose End
// 0 Name: u9053.dat
// 0 Author: William Howard [WilliamH]
// 0 !LDRAW_ORG Part UPDATE 2011-02
// 0 !LICENSE Licensed under CC BY 2.0 and CC BY 4.0 : see CAreadme.txt
// 
// 0 BFC CERTIFY CCW
  [0,"BFC","CERTIFY"],
  [0,"BFC","CCW"],
// 
// 0 !HISTORY 2011-12-21 [cwdee] Reworked subparting technique
// 0 !HISTORY 2011-12-23 [PTadmin] Renamed from 76
// 0 !HISTORY 2011-12-29 [PTadmin] Official Update 2011-02
// 
// 
// 1 16 0 0 0 2 0 0 0 1 0 0 0 2 4-4ring1.dat
  [1,16,0,0,0,2,0,0,0,1,0,0,0,2, ldraw_lib__4_4ring1(realsolid)],
// 1 16 0 0 0 2 0 0 0 1 0 0 0 2 4-4edge.dat
  [1,16,0,0,0,2,0,0,0,1,0,0,0,2, ldraw_lib__4_4edge(realsolid)],
// 0 BFC INVERTNEXT
  [0,"BFC","INVERTNEXT"],
// 1 16 0 0 0 2 0 0 0 1 0 0 0 2 4-4cyli.dat
  [1,16,0,0,0,2,0,0,0,1,0,0,0,2, ldraw_lib__4_4cyli(realsolid)],
// 1 16 0 0 0 4 0 0 0 1 0 0 0 4 4-4edge.dat
  [1,16,0,0,0,4,0,0,0,1,0,0,0,4, ldraw_lib__4_4edge(realsolid)],
// 1 16 0 0 0 4 0 0 0 1 0 0 0 4 4-4cyli.dat
  [1,16,0,0,0,4,0,0,0,1,0,0,0,4, ldraw_lib__4_4cyli(realsolid)],
// 0
];
module ldraw_lib__u9053(step=0, col=false, unit=2/5, alt=false, line=0.2, solid=!$preview)
    makepoly(ldraw_lib__u9053(solid), step=step, col=col, unit=unit, alt=alt, line=line, solid=solid);
ldraw_lib__u9053(line=0.2);
// file: 77.scad
use <../lib.scad>
use <../p/4-4cyli.scad>
$fa=1; $fs=0.2;
function ldraw_lib__77(realsolid=false) = [
// 0 ~Technic Flex-System Hose Segment
// 0 Name: 77.dat
// 0 Author: William Howard [WilliamH]
// 0 !LDRAW_ORG Part UPDATE 2011-02
// 0 !LICENSE Licensed under CC BY 2.0 and CC BY 4.0 : see CAreadme.txt
// 
// 0 BFC CERTIFY CCW
  [0,"BFC","CERTIFY"],
  [0,"BFC","CCW"],
// 
// 0 !HISTORY 2011-12-21 [cwdee] Reworked subparting technique
// 0 !HISTORY 2011-12-29 [PTadmin] Official Update 2011-02
// 
// 
// 1 16 0 0 0 4 0 0 0 1 0 0 0 4 4-4cyli.dat
  [1,16,0,0,0,4,0,0,0,1,0,0,0,4, ldraw_lib__4_4cyli(realsolid)],
// 0 BFC INVERTNEXT
  [0,"BFC","INVERTNEXT"],
// 1 16 0 0 0 2 0 0 0 1 0 0 0 2 4-4cyli.dat
  [1,16,0,0,0,2,0,0,0,1,0,0,0,2, ldraw_lib__4_4cyli(realsolid)],
// 0
];
module ldraw_lib__77(step=0, col=false, unit=2/5, alt=false, line=0.2, solid=!$preview)
    makepoly(ldraw_lib__77(solid), step=step, col=col, unit=unit, alt=alt, line=line, solid=solid);
ldraw_lib__77(line=0.2);
// main file
use <../lib.scad>
use <77.scad>
use <u9053.scad>
$fa=1; $fs=0.2;
function ldraw_lib__70688(realsolid=false) = [
// 0 Technic Flex-System Hose 27L (540LDU)
// 0 Name: 70688.dat
// 0 Author: Philippe Hurbain [Philo]
// 0 !LDRAW_ORG Part UPDATE 2020-03
// 0 !LICENSE Licensed under CC BY 2.0 and CC BY 4.0 : see CAreadme.txt
// 
// 0 BFC CERTIFY CCW
  [0,"BFC","CERTIFY"],
  [0,"BFC","CCW"],
// 
// 0 !KEYWORDS bar, tube
// 
// 0 !HISTORY 2020-12-29 [PTadmin] Official Update 2020-03
// 
// 
// 1 16 0 0 0 1 0 0 0 1 0 0 0 1 u9053.dat
  [1,16,0,0,0,1,0,0,0,1,0,0,0,1, ldraw_lib__u9053(realsolid)],
// 1 16 0 1 0 1 0 0 0 538 0 0 0 1 77.dat
  [1,16,0,1,0,1,0,0,0,538,0,0,0,1, ldraw_lib__77(realsolid)],
// 1 16 0 540 0 -1 0 0 0 -1 0 0 0 1 u9053.dat
  [1,16,0,540,0,-1,0,0,0,-1,0,0,0,1, ldraw_lib__u9053(realsolid)],
];
module ldraw_lib__70688(step=0, col=false, unit=2/5, alt=false, line=0.2, solid=!$preview)
    makepoly(ldraw_lib__70688(solid), step=step, col=col, unit=unit, alt=alt, line=line, solid=solid);
ldraw_lib__70688(line=0.2);
